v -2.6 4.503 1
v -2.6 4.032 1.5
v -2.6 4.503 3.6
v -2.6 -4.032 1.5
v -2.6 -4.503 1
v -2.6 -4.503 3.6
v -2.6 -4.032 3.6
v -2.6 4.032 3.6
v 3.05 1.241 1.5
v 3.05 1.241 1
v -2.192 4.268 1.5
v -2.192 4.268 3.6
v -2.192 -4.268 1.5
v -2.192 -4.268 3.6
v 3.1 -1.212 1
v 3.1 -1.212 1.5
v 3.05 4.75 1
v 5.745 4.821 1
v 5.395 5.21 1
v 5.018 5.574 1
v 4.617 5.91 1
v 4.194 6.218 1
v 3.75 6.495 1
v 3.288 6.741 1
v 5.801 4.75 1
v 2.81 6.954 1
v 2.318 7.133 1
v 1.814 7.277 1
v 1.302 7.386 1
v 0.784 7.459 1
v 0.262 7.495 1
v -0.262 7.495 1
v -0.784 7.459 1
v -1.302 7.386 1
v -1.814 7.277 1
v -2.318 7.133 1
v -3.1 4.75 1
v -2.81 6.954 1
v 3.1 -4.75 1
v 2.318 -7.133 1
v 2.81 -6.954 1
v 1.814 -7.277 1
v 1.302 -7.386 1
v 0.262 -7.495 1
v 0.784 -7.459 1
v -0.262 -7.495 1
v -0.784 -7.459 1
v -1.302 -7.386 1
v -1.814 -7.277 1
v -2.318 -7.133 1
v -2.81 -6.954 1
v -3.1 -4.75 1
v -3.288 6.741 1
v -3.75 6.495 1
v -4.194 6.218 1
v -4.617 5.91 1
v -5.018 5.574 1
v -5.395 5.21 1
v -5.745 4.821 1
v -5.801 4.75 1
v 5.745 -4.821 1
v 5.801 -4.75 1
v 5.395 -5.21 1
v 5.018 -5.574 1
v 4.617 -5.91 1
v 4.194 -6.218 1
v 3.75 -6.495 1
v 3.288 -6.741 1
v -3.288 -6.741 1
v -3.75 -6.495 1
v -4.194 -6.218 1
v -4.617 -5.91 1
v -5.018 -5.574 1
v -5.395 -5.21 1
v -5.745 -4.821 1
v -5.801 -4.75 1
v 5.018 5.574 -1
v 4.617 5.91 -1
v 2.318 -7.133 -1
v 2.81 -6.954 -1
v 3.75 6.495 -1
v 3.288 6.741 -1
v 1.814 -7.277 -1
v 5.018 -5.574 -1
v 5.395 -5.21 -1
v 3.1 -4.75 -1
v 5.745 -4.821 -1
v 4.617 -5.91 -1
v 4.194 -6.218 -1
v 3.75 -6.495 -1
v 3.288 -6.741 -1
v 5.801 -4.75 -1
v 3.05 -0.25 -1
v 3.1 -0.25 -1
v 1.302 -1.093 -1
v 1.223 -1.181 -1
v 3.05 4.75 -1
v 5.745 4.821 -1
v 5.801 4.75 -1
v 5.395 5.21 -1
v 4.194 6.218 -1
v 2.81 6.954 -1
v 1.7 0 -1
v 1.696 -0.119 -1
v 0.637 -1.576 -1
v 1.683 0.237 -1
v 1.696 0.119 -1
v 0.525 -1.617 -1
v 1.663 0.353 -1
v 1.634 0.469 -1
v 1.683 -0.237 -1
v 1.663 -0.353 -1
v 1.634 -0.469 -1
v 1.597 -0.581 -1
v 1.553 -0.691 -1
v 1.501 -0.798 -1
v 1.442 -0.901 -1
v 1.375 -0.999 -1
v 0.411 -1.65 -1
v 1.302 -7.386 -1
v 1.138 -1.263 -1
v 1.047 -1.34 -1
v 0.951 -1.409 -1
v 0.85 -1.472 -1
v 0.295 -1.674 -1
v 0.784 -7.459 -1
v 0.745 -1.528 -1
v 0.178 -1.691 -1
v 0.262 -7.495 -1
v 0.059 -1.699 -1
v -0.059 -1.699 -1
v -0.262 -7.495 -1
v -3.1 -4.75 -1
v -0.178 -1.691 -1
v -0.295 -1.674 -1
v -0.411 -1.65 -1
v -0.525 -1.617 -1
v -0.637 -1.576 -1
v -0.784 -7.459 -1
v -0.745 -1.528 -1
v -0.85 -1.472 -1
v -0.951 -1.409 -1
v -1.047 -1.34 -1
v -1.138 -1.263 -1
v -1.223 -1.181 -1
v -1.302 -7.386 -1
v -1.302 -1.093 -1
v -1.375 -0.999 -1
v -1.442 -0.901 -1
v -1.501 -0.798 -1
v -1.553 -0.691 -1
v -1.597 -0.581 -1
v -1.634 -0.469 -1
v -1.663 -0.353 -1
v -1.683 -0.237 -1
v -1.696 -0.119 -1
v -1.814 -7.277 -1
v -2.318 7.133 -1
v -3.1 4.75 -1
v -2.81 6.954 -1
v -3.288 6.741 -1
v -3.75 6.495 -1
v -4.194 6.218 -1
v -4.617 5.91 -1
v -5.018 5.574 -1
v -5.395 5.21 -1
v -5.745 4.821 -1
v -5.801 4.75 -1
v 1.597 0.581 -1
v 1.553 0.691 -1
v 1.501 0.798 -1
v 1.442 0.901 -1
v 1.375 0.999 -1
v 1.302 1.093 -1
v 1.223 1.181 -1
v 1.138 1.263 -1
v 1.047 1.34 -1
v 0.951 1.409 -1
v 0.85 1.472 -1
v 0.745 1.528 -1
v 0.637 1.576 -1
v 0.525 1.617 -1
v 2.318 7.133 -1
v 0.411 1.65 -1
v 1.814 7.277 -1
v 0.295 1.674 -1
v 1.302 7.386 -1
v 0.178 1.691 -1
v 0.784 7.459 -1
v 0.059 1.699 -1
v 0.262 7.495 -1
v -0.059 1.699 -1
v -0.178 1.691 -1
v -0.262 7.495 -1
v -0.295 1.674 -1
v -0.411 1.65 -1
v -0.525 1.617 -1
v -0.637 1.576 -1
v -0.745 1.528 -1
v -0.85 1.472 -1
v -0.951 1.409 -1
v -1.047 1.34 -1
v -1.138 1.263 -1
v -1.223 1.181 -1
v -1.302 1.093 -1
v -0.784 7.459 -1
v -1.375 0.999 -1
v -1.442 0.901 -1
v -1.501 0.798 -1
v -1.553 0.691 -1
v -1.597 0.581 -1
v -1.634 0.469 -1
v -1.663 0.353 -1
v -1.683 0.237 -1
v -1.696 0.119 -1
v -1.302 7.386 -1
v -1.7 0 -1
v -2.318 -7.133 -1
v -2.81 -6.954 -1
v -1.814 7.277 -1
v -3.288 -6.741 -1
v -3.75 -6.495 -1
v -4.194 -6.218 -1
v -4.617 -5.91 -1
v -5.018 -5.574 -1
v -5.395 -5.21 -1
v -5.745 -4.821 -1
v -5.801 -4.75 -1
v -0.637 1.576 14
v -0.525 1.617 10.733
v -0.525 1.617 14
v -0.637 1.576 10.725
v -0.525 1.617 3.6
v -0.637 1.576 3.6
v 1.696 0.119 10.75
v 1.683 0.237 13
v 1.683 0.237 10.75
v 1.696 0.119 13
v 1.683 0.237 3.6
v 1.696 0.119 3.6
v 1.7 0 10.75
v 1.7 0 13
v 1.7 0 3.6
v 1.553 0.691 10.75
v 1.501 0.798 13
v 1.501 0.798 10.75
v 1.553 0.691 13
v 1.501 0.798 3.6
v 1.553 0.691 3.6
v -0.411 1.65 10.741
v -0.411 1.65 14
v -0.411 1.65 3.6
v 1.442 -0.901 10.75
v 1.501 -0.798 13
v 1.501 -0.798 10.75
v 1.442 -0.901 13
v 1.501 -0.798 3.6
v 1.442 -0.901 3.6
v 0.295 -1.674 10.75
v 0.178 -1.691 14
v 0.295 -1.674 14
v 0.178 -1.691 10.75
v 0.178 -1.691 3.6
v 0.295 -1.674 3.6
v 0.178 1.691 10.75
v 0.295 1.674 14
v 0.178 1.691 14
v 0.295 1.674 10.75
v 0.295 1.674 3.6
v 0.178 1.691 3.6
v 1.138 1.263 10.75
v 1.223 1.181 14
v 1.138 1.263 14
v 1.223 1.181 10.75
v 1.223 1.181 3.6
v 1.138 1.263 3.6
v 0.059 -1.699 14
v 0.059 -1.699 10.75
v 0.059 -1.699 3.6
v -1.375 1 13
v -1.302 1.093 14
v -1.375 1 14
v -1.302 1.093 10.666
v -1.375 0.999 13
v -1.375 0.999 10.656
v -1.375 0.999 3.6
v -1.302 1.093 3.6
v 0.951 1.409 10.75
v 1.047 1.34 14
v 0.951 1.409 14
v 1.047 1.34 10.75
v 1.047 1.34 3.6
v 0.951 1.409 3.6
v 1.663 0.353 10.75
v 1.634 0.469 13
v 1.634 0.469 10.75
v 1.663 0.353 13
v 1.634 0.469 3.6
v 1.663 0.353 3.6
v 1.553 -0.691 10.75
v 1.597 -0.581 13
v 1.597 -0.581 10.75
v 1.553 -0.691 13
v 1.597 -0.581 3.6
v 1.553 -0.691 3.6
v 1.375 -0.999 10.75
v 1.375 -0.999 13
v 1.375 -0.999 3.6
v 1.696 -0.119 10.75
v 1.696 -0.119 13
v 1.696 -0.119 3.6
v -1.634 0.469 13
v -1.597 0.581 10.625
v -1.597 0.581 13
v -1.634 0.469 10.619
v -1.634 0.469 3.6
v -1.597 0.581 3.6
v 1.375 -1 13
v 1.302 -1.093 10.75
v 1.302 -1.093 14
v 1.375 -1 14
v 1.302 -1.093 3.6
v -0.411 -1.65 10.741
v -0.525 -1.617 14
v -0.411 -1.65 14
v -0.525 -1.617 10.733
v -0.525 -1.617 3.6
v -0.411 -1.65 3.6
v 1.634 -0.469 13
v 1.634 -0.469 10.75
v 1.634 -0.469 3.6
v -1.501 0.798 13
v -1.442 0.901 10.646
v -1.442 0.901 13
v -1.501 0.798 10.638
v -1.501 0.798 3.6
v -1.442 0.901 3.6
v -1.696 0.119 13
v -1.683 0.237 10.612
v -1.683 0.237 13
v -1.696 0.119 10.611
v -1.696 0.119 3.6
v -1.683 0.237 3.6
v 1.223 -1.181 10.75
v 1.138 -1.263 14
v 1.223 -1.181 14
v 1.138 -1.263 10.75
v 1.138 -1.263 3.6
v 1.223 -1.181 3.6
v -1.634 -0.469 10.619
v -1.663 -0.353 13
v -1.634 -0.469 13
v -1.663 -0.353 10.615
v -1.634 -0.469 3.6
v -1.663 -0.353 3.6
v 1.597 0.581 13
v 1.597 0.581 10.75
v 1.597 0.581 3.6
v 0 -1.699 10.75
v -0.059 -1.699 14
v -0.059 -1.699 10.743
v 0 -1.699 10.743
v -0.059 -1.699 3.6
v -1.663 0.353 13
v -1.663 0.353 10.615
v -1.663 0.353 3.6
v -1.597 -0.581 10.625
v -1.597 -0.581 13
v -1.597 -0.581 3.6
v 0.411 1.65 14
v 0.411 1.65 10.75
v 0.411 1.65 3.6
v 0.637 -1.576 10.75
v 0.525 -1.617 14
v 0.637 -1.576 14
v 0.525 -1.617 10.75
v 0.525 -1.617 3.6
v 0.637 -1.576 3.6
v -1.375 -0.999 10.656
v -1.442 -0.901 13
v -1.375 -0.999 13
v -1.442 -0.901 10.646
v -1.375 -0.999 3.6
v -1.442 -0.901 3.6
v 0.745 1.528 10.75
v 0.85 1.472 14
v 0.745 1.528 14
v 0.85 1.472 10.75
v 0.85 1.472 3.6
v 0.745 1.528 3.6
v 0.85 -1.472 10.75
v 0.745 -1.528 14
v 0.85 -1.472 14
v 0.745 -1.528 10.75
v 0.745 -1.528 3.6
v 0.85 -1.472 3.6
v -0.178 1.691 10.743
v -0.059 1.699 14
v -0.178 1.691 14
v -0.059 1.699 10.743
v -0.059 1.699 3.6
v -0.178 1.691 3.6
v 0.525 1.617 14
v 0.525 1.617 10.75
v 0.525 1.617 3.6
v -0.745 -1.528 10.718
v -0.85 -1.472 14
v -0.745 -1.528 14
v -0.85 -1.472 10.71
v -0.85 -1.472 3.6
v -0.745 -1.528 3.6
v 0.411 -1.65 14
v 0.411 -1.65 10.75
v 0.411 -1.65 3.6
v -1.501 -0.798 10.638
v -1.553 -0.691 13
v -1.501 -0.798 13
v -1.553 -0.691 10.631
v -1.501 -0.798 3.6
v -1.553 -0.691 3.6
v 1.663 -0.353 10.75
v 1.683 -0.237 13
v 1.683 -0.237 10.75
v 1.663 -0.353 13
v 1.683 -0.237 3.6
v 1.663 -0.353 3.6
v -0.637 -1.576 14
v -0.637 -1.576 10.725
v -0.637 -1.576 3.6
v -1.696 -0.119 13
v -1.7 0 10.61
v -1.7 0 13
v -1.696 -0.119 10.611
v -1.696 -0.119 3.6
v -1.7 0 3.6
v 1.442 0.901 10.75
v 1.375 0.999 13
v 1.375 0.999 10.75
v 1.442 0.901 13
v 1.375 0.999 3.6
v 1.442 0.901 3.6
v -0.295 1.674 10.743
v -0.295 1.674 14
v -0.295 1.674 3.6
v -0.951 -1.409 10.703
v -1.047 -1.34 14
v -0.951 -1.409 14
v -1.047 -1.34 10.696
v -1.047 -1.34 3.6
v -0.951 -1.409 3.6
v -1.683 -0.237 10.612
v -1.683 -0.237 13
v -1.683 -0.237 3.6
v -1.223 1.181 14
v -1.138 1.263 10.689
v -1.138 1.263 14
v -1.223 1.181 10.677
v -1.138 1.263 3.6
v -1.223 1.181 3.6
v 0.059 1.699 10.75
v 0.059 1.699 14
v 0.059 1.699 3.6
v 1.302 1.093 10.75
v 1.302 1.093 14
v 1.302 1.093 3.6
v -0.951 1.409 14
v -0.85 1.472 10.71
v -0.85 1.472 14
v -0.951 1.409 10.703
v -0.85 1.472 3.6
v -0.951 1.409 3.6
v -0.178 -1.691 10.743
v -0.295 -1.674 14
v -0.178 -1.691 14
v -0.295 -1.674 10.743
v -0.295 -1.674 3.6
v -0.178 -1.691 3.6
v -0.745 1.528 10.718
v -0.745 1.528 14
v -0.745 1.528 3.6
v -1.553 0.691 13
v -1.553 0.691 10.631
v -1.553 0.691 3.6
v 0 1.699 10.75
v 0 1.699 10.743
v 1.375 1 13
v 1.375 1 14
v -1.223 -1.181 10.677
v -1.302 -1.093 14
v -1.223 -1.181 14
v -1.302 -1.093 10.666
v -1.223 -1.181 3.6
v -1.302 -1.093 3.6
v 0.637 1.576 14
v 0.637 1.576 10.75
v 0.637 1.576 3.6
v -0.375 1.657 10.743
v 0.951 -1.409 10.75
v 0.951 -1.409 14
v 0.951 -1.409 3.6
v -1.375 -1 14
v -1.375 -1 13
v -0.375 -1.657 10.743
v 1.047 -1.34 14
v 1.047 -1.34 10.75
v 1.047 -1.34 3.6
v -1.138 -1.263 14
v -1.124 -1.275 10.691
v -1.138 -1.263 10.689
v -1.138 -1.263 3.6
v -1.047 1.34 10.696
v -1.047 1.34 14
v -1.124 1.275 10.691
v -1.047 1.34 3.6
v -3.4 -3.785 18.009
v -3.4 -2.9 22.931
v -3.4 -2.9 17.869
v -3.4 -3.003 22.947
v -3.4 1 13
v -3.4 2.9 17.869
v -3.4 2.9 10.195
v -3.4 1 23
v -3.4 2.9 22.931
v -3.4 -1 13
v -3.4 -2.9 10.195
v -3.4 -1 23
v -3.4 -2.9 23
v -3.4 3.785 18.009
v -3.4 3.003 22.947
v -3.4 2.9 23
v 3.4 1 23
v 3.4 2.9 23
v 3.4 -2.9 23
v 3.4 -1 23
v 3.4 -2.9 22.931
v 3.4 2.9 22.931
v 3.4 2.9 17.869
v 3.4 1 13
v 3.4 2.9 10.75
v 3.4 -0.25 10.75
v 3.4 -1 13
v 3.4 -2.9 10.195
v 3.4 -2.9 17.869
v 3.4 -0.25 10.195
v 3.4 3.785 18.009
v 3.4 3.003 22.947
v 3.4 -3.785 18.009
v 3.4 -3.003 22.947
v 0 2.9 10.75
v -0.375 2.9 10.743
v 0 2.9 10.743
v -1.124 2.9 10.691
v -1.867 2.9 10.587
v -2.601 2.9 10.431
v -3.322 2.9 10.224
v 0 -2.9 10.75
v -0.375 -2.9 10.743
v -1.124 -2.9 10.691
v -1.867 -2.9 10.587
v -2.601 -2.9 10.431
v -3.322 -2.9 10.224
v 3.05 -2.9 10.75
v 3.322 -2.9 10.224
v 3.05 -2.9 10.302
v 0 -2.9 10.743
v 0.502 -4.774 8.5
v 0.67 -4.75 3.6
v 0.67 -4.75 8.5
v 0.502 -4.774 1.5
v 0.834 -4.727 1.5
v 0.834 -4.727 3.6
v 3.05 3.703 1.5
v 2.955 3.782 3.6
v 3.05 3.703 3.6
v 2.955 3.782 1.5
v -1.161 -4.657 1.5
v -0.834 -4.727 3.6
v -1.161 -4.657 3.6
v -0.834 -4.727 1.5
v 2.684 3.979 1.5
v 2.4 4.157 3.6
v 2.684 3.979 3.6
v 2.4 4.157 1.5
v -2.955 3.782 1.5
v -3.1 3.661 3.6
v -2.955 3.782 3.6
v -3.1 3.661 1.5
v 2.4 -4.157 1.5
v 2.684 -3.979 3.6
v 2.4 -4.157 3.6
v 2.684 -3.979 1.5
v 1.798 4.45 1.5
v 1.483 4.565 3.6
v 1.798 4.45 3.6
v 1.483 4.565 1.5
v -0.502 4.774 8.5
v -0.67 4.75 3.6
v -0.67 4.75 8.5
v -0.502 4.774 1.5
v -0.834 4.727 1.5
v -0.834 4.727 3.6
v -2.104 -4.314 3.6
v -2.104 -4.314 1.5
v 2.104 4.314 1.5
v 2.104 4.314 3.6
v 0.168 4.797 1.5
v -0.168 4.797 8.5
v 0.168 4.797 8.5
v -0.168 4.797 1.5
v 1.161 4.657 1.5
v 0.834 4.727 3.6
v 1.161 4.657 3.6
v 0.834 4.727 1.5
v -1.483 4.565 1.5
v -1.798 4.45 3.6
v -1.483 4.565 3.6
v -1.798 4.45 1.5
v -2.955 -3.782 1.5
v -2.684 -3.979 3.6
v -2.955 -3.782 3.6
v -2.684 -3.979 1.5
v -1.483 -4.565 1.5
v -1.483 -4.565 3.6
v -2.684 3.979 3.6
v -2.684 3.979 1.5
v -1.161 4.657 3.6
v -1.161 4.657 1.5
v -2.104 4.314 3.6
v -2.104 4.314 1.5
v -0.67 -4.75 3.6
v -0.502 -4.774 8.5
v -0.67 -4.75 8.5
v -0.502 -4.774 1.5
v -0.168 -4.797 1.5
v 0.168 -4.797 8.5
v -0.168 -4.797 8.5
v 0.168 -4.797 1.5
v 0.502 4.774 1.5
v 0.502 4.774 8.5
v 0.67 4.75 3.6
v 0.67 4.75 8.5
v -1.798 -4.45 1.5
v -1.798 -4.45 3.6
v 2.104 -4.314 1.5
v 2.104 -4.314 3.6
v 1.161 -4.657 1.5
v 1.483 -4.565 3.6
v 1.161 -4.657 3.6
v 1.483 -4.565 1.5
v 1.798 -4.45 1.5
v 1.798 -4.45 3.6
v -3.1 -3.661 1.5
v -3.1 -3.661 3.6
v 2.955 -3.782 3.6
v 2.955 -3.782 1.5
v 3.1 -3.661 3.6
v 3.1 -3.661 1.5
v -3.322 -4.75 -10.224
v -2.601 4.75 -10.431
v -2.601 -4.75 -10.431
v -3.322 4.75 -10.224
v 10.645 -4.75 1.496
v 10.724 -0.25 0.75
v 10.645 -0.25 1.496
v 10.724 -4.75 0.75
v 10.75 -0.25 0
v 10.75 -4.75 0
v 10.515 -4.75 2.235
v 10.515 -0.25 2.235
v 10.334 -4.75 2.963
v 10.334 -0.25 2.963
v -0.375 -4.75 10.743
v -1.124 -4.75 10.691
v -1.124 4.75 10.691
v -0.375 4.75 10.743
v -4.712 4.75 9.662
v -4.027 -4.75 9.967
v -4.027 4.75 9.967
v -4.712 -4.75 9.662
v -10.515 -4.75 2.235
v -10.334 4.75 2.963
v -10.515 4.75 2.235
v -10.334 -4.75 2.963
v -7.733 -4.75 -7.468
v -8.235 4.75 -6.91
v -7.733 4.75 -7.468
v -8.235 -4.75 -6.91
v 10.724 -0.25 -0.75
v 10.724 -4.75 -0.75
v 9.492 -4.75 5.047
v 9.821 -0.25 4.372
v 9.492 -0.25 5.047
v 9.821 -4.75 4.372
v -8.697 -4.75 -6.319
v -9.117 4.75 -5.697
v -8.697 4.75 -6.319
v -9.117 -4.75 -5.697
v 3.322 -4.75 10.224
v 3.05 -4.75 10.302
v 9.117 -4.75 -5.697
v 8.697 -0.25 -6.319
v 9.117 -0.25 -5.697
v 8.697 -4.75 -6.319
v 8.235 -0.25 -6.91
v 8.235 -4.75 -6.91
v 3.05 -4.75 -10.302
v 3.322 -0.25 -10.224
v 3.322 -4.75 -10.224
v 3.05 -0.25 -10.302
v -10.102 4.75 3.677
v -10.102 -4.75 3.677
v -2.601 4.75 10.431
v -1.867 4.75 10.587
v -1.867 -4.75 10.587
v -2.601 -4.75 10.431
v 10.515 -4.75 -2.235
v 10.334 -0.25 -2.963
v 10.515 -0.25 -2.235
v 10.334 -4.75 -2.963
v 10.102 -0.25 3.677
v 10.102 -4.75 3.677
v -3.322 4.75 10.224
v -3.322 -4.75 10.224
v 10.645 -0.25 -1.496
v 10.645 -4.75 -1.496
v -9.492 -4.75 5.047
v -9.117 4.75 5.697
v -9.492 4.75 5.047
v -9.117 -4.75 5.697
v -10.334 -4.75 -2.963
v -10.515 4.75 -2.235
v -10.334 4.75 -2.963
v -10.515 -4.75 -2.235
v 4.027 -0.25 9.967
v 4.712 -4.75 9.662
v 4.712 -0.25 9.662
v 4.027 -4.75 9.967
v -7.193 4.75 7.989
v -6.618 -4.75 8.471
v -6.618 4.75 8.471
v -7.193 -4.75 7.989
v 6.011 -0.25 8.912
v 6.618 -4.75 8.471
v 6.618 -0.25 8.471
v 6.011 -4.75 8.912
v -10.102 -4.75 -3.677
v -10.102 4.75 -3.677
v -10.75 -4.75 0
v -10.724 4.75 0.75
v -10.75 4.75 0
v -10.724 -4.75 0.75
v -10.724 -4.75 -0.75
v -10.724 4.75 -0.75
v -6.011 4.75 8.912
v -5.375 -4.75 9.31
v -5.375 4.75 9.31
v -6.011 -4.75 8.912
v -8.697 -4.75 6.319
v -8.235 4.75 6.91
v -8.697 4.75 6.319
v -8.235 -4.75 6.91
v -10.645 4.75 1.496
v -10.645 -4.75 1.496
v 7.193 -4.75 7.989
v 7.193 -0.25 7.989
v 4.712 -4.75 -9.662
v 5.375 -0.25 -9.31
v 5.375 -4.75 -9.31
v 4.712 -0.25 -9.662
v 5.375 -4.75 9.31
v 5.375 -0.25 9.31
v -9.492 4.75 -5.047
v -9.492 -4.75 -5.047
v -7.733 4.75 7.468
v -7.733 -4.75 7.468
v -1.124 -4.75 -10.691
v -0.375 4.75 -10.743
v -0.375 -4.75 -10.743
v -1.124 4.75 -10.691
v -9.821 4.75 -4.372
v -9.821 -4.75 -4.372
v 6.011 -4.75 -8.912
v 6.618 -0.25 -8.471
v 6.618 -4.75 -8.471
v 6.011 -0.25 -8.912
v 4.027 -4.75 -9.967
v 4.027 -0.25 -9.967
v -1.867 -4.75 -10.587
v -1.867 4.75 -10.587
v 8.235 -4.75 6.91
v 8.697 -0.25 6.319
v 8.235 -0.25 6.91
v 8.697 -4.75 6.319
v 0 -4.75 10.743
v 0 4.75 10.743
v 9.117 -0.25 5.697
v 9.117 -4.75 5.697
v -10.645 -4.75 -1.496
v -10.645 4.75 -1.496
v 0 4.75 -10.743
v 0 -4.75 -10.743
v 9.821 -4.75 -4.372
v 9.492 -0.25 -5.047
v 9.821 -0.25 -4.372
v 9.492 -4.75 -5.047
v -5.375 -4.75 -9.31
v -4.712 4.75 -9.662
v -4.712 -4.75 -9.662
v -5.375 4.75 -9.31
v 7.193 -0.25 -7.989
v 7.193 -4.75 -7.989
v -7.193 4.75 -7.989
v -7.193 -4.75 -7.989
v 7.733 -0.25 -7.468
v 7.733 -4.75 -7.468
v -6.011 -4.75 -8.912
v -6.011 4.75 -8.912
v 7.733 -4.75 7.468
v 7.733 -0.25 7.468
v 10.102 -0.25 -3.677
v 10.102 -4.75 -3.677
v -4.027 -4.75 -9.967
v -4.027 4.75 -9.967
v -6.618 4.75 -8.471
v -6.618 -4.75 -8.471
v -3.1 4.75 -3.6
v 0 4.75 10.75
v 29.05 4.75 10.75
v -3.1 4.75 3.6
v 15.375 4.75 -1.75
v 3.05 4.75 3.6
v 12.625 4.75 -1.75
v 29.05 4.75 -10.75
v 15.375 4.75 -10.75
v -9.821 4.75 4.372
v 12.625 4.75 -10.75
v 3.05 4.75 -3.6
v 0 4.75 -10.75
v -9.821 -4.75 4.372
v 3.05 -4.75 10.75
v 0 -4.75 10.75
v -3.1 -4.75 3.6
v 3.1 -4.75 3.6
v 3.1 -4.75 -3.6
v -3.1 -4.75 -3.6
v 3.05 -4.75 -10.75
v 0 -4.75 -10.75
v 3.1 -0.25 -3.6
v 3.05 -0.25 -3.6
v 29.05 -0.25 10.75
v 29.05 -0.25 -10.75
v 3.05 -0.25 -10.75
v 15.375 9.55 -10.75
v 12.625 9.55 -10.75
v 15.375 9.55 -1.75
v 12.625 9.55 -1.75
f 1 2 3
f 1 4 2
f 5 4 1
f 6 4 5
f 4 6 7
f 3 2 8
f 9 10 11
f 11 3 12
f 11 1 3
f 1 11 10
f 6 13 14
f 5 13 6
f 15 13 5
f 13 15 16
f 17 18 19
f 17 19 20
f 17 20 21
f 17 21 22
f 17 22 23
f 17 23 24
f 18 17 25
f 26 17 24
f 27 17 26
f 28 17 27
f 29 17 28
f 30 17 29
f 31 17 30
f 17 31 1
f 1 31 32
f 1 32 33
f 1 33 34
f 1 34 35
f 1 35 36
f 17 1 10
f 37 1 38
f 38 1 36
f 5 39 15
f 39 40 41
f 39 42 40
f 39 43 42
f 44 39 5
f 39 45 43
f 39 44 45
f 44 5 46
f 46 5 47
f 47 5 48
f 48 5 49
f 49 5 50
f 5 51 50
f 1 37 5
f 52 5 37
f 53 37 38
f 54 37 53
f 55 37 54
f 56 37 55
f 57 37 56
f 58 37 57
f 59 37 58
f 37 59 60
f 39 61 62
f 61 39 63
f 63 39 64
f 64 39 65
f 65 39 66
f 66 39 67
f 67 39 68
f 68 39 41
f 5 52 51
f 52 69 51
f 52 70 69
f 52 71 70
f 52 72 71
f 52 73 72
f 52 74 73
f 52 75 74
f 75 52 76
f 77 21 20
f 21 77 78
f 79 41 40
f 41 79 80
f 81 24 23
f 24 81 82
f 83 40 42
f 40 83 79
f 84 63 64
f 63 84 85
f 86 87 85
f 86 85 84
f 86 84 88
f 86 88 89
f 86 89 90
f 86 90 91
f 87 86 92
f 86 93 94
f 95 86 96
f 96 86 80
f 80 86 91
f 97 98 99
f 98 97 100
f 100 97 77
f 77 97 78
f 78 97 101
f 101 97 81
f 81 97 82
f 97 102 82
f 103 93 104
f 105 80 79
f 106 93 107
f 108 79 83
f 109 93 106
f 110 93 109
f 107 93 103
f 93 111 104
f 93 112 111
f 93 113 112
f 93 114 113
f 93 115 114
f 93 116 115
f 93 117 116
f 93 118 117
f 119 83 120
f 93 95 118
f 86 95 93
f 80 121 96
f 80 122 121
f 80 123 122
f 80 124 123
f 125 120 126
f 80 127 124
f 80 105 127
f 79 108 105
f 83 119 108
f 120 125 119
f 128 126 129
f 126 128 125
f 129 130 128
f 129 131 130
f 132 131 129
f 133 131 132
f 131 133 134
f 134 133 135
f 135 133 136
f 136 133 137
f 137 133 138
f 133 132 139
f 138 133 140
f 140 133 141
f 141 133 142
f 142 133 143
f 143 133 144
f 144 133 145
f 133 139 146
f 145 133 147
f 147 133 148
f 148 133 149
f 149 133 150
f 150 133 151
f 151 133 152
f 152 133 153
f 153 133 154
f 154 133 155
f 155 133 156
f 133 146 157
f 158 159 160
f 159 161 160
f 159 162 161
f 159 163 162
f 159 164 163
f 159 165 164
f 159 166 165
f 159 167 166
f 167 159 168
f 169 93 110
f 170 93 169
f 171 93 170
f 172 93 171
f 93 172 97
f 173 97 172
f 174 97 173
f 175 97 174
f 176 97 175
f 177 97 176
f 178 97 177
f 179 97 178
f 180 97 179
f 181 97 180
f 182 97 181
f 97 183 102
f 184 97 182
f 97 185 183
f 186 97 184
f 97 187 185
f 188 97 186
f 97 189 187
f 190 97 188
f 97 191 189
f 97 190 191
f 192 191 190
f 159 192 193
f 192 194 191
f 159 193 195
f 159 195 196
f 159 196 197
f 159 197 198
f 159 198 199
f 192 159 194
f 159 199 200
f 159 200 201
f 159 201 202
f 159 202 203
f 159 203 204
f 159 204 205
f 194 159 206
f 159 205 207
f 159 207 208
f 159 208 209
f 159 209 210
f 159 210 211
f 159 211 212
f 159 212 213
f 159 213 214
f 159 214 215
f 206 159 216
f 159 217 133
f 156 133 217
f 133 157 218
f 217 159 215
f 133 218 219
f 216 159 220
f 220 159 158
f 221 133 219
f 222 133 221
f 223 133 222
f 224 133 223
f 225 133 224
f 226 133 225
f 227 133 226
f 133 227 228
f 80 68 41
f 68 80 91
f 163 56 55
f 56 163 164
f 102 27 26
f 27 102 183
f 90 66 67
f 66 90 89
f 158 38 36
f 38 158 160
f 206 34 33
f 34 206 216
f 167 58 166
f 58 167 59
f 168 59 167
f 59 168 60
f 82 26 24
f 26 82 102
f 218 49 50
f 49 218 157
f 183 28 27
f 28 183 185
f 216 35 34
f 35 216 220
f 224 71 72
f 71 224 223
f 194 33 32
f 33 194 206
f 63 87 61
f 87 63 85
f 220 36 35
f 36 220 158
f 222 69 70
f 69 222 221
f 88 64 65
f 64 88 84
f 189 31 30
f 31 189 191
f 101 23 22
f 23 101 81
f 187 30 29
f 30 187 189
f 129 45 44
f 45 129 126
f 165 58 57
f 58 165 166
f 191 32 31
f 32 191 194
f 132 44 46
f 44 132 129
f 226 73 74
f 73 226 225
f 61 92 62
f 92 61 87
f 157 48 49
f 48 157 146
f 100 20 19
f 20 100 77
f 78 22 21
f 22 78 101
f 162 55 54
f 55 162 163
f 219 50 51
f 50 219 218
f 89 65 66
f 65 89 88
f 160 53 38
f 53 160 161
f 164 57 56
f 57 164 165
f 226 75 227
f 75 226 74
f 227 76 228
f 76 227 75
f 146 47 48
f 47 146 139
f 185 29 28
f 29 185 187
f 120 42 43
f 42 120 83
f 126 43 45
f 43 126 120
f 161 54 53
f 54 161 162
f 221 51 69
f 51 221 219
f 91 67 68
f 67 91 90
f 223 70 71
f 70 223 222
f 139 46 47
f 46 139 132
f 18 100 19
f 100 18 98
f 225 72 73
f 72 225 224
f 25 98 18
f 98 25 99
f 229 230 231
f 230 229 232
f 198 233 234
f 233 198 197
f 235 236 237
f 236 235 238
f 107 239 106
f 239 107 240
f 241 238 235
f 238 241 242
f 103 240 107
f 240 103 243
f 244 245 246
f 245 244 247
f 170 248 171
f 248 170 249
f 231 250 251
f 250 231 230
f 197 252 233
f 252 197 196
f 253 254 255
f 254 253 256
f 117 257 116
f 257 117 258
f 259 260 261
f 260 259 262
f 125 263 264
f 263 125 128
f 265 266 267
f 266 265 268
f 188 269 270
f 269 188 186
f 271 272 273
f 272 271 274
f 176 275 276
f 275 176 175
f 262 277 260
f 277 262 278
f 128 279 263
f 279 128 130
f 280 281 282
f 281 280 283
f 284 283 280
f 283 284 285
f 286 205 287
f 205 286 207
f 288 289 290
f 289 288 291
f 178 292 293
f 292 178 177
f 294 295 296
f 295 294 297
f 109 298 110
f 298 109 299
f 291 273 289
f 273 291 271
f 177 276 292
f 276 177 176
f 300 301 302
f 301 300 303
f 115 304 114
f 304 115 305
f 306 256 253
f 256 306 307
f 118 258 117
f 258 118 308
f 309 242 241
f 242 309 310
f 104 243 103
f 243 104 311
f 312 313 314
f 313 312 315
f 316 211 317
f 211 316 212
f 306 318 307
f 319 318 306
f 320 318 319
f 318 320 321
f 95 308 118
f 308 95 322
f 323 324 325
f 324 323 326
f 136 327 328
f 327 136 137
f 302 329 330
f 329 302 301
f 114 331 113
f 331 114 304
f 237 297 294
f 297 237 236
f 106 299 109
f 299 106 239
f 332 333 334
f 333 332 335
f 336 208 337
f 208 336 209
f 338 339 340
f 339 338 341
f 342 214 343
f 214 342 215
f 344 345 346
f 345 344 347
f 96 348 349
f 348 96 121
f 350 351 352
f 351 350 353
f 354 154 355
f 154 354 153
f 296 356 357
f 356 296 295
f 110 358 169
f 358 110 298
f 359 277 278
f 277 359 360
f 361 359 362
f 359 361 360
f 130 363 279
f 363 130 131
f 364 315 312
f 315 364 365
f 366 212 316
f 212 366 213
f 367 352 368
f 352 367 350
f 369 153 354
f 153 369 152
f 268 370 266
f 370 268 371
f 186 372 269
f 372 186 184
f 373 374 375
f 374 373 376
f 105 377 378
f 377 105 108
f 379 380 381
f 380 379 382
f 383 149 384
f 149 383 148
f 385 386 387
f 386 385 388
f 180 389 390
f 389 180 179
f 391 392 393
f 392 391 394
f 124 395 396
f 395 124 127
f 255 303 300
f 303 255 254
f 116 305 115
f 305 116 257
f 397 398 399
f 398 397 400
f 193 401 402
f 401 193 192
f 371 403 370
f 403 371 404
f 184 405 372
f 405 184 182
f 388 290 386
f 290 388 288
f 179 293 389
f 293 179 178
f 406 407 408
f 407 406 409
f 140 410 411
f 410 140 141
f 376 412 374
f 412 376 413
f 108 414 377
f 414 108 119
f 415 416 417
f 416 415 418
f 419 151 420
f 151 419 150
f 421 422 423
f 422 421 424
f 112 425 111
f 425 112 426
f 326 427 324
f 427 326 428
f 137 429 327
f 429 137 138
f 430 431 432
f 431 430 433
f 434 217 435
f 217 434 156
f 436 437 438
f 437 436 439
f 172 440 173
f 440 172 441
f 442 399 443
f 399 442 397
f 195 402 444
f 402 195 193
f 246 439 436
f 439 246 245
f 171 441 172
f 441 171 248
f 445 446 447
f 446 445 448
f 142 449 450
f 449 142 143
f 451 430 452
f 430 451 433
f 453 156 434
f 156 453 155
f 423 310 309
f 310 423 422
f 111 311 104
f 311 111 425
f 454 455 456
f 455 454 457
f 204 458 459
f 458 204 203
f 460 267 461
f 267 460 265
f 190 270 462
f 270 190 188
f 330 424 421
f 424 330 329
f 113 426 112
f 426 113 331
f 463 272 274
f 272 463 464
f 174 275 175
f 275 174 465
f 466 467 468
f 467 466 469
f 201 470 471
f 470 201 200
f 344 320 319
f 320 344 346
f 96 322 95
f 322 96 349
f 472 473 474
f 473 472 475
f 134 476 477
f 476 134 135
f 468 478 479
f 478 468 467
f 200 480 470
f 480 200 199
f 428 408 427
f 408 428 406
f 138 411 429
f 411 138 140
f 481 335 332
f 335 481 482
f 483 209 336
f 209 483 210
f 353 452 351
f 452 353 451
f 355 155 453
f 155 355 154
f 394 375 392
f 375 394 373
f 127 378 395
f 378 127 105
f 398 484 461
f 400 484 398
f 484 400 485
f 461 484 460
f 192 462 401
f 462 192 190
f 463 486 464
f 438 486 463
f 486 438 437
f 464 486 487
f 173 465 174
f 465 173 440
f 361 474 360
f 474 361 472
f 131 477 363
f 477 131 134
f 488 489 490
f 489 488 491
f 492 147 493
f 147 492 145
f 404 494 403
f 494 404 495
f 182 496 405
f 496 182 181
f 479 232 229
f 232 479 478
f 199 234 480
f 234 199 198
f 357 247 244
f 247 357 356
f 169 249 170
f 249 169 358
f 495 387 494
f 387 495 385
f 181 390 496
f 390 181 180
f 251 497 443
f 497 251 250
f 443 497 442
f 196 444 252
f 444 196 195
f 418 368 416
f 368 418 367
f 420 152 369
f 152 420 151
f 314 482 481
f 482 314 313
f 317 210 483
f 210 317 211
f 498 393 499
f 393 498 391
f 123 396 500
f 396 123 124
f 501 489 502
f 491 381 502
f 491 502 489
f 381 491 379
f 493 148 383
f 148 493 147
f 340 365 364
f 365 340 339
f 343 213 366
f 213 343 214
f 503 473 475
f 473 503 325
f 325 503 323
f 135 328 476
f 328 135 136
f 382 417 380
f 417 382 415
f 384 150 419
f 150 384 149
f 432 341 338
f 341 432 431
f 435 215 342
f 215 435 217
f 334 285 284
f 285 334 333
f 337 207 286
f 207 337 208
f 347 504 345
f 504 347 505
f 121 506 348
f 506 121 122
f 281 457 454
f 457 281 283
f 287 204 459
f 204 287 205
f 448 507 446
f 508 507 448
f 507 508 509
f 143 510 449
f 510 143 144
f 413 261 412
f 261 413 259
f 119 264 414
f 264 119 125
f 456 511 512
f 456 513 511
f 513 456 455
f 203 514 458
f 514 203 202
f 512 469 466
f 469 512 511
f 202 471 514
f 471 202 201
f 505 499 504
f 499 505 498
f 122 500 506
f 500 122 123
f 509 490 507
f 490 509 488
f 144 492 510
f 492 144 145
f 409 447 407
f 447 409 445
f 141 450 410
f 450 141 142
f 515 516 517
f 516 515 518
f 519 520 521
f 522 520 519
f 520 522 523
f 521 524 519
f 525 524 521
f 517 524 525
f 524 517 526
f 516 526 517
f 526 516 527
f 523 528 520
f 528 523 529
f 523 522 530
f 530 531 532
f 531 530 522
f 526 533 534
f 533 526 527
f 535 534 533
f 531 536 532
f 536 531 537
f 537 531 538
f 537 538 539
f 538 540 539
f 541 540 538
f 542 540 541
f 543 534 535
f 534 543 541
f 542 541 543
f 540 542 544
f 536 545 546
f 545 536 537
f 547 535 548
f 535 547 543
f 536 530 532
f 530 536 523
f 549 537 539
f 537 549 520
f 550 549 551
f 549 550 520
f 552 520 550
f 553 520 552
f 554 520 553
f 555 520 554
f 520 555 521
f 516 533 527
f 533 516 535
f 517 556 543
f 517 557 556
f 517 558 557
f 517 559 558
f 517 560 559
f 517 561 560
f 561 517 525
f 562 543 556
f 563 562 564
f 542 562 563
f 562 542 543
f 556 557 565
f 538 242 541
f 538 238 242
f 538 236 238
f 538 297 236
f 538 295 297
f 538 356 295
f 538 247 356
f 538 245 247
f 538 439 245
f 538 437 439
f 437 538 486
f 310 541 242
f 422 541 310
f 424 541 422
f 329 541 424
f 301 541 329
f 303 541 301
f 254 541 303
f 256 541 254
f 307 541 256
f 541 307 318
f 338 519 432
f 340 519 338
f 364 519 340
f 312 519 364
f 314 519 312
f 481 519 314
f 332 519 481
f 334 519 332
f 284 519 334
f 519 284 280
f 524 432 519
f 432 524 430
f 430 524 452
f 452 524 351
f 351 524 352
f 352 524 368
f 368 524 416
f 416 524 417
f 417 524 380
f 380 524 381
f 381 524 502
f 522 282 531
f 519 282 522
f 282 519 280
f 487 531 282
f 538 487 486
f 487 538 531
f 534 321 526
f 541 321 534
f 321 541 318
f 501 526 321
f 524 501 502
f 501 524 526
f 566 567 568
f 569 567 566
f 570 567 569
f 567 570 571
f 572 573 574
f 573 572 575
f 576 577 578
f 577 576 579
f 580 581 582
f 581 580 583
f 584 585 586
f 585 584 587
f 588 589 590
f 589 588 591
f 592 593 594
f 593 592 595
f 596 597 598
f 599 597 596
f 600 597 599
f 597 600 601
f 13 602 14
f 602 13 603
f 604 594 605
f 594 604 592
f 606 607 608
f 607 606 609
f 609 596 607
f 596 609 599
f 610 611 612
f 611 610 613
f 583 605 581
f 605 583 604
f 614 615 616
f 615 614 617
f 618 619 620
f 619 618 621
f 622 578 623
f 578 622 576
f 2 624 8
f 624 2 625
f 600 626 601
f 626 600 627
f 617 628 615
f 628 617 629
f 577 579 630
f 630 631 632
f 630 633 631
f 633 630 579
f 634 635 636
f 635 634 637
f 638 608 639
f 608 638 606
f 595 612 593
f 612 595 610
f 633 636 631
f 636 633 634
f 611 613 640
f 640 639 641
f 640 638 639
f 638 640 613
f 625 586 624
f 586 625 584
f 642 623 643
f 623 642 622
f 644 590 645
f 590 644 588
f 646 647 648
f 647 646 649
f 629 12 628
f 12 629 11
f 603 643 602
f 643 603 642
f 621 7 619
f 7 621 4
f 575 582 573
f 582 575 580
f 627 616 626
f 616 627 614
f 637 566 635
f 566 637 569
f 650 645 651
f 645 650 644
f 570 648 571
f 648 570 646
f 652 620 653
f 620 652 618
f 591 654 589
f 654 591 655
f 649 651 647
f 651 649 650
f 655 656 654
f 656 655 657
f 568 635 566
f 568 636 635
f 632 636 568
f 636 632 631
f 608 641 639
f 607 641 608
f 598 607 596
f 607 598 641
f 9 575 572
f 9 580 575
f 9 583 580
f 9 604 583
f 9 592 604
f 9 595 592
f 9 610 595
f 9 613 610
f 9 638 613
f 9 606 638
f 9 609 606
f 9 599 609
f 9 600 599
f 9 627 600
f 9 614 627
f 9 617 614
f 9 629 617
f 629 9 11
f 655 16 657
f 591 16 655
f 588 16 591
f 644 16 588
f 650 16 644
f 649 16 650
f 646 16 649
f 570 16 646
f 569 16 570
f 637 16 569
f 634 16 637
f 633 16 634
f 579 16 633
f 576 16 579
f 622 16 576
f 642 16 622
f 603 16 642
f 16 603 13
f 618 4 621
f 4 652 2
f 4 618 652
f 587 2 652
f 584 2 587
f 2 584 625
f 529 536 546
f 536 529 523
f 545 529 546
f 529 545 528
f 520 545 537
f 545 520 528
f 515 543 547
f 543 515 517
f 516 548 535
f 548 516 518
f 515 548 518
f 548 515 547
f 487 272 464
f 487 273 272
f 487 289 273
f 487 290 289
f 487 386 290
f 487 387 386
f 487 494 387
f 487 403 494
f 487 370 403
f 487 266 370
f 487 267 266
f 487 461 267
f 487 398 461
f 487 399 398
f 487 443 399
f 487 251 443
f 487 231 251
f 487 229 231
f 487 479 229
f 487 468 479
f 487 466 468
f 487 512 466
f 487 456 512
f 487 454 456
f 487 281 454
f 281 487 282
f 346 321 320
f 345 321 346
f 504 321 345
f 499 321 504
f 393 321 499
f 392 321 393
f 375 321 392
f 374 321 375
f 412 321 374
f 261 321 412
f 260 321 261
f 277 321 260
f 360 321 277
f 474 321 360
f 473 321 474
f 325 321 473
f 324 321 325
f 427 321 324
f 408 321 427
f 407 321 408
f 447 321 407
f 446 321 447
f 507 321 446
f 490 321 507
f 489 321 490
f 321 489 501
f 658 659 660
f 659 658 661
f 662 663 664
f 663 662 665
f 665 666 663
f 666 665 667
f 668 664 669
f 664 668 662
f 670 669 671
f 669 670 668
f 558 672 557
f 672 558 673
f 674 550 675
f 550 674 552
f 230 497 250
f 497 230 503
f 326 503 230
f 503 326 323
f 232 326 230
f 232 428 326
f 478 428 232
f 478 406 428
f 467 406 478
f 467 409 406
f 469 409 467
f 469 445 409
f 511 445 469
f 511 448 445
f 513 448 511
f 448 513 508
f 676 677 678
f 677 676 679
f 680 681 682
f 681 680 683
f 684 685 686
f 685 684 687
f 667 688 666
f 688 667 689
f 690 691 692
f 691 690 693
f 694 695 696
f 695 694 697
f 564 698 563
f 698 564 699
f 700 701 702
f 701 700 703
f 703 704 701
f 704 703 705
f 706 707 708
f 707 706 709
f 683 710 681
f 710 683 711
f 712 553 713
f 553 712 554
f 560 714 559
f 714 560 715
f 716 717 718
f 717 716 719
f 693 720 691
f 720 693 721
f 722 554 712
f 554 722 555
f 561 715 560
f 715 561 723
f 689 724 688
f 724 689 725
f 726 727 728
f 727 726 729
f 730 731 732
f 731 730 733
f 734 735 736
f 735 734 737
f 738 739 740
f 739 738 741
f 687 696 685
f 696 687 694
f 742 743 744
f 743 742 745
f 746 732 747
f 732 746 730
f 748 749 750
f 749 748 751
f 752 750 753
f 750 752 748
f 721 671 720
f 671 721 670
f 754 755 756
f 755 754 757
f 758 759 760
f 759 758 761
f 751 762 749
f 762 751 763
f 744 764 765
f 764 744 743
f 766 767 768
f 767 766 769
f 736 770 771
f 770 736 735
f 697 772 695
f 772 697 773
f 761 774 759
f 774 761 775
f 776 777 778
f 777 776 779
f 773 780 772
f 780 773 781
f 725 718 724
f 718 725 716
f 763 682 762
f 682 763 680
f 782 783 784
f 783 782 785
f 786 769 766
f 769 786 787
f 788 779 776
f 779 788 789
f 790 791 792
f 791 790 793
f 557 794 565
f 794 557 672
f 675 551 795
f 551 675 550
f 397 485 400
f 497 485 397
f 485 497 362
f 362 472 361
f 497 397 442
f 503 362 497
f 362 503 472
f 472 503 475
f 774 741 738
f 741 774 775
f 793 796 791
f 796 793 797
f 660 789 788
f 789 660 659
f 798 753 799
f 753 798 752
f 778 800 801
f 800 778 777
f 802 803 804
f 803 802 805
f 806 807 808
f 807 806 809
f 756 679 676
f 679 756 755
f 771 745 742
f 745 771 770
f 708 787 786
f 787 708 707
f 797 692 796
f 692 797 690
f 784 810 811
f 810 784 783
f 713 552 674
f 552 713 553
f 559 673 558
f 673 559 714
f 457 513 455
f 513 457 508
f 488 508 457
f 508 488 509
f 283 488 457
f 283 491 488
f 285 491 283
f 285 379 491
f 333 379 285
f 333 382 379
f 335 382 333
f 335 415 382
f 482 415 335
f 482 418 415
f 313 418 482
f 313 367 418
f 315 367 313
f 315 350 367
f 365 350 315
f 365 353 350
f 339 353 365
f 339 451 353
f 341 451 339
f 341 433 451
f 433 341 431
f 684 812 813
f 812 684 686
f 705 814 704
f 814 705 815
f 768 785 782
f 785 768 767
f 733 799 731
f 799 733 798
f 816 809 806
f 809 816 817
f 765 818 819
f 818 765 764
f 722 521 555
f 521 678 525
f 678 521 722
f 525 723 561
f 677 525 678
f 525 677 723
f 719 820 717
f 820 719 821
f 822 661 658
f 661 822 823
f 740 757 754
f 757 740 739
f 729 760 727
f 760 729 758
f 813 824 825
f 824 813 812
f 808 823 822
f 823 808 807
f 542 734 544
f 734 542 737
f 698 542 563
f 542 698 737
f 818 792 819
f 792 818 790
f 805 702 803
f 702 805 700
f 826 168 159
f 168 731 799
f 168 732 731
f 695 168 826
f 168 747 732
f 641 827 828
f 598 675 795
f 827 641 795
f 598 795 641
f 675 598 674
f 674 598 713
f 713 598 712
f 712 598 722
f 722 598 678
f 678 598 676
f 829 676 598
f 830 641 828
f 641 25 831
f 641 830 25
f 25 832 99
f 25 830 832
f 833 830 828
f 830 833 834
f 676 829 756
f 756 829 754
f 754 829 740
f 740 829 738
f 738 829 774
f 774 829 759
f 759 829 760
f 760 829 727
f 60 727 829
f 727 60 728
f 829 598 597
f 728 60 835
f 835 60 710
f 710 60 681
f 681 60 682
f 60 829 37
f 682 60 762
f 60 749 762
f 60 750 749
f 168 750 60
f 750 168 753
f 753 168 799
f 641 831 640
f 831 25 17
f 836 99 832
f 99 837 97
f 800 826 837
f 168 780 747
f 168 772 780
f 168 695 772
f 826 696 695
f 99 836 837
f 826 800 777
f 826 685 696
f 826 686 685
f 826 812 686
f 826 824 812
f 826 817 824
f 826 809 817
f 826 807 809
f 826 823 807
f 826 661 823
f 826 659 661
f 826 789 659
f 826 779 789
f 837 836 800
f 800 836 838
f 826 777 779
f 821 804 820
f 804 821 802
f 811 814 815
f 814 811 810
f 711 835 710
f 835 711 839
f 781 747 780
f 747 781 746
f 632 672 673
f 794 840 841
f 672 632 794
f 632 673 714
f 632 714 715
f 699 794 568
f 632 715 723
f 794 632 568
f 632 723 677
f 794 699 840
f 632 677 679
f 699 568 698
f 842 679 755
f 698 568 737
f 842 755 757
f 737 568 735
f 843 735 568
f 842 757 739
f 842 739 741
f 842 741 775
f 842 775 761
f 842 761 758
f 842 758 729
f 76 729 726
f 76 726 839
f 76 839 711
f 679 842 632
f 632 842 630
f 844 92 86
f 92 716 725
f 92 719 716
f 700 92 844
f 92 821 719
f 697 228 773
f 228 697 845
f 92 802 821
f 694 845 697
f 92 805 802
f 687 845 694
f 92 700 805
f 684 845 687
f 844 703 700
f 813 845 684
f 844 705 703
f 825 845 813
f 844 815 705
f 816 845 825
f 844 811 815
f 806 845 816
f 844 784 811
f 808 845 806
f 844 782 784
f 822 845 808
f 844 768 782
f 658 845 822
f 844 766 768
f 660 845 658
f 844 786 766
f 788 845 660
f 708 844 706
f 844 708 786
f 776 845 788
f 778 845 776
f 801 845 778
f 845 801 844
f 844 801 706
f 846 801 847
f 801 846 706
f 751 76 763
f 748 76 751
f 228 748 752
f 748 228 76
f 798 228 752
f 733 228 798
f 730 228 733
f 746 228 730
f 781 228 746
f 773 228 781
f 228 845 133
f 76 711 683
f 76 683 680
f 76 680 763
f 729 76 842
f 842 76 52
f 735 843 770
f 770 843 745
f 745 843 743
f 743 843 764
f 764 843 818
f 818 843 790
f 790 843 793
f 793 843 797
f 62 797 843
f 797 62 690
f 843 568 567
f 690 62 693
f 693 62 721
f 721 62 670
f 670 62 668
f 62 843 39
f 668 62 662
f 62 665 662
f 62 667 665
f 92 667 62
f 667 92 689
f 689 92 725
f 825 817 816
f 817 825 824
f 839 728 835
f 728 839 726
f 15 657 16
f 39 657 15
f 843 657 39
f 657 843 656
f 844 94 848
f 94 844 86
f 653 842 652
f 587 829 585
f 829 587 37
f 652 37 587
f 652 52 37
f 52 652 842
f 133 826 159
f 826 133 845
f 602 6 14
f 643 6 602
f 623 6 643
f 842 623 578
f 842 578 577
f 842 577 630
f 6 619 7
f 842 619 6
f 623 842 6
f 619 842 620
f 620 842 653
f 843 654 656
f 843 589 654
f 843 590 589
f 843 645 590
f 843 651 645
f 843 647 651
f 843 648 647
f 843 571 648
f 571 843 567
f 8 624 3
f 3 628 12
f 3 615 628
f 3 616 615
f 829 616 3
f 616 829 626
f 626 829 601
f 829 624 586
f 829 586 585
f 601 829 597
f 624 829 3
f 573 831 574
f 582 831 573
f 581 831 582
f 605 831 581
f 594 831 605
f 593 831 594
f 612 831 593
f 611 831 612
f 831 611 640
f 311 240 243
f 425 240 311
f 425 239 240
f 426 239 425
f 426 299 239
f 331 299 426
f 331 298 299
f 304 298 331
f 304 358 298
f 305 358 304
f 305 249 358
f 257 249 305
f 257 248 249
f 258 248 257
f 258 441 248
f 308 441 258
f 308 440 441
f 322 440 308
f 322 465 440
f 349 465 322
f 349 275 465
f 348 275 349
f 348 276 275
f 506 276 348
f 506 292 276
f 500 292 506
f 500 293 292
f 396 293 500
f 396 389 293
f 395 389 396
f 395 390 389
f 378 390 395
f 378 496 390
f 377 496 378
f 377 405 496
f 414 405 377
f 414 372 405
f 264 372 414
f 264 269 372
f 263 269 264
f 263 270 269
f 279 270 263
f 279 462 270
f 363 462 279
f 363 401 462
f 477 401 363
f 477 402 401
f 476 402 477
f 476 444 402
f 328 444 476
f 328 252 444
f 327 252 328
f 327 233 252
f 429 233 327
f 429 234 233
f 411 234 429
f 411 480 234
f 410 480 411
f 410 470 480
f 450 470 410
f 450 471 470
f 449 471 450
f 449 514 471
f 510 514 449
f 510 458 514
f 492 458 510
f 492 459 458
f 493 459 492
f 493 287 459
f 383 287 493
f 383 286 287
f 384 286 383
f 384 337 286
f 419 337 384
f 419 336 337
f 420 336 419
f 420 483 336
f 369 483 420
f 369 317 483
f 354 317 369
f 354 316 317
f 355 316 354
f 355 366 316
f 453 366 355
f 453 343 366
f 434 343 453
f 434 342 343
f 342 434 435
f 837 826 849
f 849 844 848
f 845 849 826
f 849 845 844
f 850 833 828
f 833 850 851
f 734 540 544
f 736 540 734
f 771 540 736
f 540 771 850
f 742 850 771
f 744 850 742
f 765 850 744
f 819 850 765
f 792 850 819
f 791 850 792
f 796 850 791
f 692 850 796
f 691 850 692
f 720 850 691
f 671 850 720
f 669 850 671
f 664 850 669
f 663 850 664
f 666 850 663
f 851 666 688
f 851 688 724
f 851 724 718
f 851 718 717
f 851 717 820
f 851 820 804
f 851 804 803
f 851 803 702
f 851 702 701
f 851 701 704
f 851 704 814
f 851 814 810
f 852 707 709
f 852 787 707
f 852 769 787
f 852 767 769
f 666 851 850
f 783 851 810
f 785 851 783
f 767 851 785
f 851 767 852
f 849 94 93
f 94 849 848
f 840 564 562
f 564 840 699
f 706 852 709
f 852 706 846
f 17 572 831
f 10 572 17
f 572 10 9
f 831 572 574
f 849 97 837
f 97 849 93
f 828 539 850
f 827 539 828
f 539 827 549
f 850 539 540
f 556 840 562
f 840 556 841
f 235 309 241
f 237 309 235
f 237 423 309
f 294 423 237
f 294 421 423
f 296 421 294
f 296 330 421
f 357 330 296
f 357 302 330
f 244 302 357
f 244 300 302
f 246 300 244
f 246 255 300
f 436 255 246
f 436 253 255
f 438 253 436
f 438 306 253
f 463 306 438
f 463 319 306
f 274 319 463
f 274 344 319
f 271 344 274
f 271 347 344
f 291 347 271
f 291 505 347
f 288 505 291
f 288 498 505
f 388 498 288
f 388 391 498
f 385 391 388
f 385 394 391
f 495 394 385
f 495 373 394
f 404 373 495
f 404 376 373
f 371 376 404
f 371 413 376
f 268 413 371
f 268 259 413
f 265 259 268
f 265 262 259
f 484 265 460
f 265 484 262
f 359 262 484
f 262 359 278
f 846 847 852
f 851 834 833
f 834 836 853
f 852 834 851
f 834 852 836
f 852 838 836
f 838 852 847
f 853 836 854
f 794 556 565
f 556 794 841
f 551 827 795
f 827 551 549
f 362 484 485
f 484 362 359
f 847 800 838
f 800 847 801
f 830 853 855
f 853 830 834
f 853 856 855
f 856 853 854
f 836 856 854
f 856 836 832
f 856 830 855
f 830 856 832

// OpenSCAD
/*
 * Copyright 2020 Phil Haigh
 *
 * Licensed under the Apache License, Version 2.0 (the "License");
 * you may not use this file except in compliance with the License.
 * You may obtain a copy of the License at
 *
 * http://www.apache.org/licenses/LICENSE-2.0
 *
 * Unless required by applicable law or agreed to in writing, software
 * distributed under the License is distributed on an "AS IS" BASIS,
 * WITHOUT WARRANTIES OR CONDITIONS OF ANY KIND, either express or implied.
 * See the License for the specific language governing permissions and
 * limitations under the License.
 */

module topHalf() {
    difference() {
    
        union() {
            translate([0, 0, 1 + 4]) cylinder(h=8, d=10.4, center=true, $fn=3);
            cylinder(h=2, d=15, center=true, $fn=90);
        };
        translate([0, 0, -2.5]) cylinder(h=8 + 2 + 8 + 5, d=3.4, center=true, $fn=90);

    };
};


module bottomHalf() {
    difference() {
    
        union() {
            translate([0, 0, -1 -4 ]) cylinder(h=7, d=9.6, center=true, $fn=90);
            translate([0, 0, -1 -7 -7.5])
            difference() {
                cube([6.8, 5.8, 15], center=true);
                translate([0, 0, -2.5]) cube([6.8, 2, 10], center=true);    
            };
            translate([0, 2.9, -1 -7 -10 -2.4]) rotate([-9, 0, 0]) cube([6.8, 1, 5], center=true);
            translate([0, -2.9, -1 -7 -10 -2.4]) rotate([9, 0, 0]) cube([6.8, 1, 5], center=true);        };
        translate([0, 0, -2.5]) cylinder(h=8 + 2 + 8 + 5, d=3.4, center=true, $fn=90);
    };
};

module latch() {
    
    difference() {
        cylinder(h=9.5, d=21.5, center=true, $fn=90);
        cube([6.2, 7.2, 9.5], center=true);
    };
    translate([(26/2) + (6.1/2), 0, -4.75 + (5/2) ]) cube([26, 21.5, 5], center=true);
    translate([(6.1/4), (21.5/2) - 1, 0]) cube([(6.1/2), 2, 9.5], center=true);
    translate([(6.1/4), -(21.5/2) + 1, 0]) cube([(6.1/2), 2, 9.5], center=true);
    translate([14, -(21.5/2) + (9/2), -(9.5/2) -(4.8/2)]) cube([2.75, 9, 4.8], center=true);

};


topHalf();
rotate([0, 180, 0]) bottomHalf();
rotate([90, 0, 0]) latch();
